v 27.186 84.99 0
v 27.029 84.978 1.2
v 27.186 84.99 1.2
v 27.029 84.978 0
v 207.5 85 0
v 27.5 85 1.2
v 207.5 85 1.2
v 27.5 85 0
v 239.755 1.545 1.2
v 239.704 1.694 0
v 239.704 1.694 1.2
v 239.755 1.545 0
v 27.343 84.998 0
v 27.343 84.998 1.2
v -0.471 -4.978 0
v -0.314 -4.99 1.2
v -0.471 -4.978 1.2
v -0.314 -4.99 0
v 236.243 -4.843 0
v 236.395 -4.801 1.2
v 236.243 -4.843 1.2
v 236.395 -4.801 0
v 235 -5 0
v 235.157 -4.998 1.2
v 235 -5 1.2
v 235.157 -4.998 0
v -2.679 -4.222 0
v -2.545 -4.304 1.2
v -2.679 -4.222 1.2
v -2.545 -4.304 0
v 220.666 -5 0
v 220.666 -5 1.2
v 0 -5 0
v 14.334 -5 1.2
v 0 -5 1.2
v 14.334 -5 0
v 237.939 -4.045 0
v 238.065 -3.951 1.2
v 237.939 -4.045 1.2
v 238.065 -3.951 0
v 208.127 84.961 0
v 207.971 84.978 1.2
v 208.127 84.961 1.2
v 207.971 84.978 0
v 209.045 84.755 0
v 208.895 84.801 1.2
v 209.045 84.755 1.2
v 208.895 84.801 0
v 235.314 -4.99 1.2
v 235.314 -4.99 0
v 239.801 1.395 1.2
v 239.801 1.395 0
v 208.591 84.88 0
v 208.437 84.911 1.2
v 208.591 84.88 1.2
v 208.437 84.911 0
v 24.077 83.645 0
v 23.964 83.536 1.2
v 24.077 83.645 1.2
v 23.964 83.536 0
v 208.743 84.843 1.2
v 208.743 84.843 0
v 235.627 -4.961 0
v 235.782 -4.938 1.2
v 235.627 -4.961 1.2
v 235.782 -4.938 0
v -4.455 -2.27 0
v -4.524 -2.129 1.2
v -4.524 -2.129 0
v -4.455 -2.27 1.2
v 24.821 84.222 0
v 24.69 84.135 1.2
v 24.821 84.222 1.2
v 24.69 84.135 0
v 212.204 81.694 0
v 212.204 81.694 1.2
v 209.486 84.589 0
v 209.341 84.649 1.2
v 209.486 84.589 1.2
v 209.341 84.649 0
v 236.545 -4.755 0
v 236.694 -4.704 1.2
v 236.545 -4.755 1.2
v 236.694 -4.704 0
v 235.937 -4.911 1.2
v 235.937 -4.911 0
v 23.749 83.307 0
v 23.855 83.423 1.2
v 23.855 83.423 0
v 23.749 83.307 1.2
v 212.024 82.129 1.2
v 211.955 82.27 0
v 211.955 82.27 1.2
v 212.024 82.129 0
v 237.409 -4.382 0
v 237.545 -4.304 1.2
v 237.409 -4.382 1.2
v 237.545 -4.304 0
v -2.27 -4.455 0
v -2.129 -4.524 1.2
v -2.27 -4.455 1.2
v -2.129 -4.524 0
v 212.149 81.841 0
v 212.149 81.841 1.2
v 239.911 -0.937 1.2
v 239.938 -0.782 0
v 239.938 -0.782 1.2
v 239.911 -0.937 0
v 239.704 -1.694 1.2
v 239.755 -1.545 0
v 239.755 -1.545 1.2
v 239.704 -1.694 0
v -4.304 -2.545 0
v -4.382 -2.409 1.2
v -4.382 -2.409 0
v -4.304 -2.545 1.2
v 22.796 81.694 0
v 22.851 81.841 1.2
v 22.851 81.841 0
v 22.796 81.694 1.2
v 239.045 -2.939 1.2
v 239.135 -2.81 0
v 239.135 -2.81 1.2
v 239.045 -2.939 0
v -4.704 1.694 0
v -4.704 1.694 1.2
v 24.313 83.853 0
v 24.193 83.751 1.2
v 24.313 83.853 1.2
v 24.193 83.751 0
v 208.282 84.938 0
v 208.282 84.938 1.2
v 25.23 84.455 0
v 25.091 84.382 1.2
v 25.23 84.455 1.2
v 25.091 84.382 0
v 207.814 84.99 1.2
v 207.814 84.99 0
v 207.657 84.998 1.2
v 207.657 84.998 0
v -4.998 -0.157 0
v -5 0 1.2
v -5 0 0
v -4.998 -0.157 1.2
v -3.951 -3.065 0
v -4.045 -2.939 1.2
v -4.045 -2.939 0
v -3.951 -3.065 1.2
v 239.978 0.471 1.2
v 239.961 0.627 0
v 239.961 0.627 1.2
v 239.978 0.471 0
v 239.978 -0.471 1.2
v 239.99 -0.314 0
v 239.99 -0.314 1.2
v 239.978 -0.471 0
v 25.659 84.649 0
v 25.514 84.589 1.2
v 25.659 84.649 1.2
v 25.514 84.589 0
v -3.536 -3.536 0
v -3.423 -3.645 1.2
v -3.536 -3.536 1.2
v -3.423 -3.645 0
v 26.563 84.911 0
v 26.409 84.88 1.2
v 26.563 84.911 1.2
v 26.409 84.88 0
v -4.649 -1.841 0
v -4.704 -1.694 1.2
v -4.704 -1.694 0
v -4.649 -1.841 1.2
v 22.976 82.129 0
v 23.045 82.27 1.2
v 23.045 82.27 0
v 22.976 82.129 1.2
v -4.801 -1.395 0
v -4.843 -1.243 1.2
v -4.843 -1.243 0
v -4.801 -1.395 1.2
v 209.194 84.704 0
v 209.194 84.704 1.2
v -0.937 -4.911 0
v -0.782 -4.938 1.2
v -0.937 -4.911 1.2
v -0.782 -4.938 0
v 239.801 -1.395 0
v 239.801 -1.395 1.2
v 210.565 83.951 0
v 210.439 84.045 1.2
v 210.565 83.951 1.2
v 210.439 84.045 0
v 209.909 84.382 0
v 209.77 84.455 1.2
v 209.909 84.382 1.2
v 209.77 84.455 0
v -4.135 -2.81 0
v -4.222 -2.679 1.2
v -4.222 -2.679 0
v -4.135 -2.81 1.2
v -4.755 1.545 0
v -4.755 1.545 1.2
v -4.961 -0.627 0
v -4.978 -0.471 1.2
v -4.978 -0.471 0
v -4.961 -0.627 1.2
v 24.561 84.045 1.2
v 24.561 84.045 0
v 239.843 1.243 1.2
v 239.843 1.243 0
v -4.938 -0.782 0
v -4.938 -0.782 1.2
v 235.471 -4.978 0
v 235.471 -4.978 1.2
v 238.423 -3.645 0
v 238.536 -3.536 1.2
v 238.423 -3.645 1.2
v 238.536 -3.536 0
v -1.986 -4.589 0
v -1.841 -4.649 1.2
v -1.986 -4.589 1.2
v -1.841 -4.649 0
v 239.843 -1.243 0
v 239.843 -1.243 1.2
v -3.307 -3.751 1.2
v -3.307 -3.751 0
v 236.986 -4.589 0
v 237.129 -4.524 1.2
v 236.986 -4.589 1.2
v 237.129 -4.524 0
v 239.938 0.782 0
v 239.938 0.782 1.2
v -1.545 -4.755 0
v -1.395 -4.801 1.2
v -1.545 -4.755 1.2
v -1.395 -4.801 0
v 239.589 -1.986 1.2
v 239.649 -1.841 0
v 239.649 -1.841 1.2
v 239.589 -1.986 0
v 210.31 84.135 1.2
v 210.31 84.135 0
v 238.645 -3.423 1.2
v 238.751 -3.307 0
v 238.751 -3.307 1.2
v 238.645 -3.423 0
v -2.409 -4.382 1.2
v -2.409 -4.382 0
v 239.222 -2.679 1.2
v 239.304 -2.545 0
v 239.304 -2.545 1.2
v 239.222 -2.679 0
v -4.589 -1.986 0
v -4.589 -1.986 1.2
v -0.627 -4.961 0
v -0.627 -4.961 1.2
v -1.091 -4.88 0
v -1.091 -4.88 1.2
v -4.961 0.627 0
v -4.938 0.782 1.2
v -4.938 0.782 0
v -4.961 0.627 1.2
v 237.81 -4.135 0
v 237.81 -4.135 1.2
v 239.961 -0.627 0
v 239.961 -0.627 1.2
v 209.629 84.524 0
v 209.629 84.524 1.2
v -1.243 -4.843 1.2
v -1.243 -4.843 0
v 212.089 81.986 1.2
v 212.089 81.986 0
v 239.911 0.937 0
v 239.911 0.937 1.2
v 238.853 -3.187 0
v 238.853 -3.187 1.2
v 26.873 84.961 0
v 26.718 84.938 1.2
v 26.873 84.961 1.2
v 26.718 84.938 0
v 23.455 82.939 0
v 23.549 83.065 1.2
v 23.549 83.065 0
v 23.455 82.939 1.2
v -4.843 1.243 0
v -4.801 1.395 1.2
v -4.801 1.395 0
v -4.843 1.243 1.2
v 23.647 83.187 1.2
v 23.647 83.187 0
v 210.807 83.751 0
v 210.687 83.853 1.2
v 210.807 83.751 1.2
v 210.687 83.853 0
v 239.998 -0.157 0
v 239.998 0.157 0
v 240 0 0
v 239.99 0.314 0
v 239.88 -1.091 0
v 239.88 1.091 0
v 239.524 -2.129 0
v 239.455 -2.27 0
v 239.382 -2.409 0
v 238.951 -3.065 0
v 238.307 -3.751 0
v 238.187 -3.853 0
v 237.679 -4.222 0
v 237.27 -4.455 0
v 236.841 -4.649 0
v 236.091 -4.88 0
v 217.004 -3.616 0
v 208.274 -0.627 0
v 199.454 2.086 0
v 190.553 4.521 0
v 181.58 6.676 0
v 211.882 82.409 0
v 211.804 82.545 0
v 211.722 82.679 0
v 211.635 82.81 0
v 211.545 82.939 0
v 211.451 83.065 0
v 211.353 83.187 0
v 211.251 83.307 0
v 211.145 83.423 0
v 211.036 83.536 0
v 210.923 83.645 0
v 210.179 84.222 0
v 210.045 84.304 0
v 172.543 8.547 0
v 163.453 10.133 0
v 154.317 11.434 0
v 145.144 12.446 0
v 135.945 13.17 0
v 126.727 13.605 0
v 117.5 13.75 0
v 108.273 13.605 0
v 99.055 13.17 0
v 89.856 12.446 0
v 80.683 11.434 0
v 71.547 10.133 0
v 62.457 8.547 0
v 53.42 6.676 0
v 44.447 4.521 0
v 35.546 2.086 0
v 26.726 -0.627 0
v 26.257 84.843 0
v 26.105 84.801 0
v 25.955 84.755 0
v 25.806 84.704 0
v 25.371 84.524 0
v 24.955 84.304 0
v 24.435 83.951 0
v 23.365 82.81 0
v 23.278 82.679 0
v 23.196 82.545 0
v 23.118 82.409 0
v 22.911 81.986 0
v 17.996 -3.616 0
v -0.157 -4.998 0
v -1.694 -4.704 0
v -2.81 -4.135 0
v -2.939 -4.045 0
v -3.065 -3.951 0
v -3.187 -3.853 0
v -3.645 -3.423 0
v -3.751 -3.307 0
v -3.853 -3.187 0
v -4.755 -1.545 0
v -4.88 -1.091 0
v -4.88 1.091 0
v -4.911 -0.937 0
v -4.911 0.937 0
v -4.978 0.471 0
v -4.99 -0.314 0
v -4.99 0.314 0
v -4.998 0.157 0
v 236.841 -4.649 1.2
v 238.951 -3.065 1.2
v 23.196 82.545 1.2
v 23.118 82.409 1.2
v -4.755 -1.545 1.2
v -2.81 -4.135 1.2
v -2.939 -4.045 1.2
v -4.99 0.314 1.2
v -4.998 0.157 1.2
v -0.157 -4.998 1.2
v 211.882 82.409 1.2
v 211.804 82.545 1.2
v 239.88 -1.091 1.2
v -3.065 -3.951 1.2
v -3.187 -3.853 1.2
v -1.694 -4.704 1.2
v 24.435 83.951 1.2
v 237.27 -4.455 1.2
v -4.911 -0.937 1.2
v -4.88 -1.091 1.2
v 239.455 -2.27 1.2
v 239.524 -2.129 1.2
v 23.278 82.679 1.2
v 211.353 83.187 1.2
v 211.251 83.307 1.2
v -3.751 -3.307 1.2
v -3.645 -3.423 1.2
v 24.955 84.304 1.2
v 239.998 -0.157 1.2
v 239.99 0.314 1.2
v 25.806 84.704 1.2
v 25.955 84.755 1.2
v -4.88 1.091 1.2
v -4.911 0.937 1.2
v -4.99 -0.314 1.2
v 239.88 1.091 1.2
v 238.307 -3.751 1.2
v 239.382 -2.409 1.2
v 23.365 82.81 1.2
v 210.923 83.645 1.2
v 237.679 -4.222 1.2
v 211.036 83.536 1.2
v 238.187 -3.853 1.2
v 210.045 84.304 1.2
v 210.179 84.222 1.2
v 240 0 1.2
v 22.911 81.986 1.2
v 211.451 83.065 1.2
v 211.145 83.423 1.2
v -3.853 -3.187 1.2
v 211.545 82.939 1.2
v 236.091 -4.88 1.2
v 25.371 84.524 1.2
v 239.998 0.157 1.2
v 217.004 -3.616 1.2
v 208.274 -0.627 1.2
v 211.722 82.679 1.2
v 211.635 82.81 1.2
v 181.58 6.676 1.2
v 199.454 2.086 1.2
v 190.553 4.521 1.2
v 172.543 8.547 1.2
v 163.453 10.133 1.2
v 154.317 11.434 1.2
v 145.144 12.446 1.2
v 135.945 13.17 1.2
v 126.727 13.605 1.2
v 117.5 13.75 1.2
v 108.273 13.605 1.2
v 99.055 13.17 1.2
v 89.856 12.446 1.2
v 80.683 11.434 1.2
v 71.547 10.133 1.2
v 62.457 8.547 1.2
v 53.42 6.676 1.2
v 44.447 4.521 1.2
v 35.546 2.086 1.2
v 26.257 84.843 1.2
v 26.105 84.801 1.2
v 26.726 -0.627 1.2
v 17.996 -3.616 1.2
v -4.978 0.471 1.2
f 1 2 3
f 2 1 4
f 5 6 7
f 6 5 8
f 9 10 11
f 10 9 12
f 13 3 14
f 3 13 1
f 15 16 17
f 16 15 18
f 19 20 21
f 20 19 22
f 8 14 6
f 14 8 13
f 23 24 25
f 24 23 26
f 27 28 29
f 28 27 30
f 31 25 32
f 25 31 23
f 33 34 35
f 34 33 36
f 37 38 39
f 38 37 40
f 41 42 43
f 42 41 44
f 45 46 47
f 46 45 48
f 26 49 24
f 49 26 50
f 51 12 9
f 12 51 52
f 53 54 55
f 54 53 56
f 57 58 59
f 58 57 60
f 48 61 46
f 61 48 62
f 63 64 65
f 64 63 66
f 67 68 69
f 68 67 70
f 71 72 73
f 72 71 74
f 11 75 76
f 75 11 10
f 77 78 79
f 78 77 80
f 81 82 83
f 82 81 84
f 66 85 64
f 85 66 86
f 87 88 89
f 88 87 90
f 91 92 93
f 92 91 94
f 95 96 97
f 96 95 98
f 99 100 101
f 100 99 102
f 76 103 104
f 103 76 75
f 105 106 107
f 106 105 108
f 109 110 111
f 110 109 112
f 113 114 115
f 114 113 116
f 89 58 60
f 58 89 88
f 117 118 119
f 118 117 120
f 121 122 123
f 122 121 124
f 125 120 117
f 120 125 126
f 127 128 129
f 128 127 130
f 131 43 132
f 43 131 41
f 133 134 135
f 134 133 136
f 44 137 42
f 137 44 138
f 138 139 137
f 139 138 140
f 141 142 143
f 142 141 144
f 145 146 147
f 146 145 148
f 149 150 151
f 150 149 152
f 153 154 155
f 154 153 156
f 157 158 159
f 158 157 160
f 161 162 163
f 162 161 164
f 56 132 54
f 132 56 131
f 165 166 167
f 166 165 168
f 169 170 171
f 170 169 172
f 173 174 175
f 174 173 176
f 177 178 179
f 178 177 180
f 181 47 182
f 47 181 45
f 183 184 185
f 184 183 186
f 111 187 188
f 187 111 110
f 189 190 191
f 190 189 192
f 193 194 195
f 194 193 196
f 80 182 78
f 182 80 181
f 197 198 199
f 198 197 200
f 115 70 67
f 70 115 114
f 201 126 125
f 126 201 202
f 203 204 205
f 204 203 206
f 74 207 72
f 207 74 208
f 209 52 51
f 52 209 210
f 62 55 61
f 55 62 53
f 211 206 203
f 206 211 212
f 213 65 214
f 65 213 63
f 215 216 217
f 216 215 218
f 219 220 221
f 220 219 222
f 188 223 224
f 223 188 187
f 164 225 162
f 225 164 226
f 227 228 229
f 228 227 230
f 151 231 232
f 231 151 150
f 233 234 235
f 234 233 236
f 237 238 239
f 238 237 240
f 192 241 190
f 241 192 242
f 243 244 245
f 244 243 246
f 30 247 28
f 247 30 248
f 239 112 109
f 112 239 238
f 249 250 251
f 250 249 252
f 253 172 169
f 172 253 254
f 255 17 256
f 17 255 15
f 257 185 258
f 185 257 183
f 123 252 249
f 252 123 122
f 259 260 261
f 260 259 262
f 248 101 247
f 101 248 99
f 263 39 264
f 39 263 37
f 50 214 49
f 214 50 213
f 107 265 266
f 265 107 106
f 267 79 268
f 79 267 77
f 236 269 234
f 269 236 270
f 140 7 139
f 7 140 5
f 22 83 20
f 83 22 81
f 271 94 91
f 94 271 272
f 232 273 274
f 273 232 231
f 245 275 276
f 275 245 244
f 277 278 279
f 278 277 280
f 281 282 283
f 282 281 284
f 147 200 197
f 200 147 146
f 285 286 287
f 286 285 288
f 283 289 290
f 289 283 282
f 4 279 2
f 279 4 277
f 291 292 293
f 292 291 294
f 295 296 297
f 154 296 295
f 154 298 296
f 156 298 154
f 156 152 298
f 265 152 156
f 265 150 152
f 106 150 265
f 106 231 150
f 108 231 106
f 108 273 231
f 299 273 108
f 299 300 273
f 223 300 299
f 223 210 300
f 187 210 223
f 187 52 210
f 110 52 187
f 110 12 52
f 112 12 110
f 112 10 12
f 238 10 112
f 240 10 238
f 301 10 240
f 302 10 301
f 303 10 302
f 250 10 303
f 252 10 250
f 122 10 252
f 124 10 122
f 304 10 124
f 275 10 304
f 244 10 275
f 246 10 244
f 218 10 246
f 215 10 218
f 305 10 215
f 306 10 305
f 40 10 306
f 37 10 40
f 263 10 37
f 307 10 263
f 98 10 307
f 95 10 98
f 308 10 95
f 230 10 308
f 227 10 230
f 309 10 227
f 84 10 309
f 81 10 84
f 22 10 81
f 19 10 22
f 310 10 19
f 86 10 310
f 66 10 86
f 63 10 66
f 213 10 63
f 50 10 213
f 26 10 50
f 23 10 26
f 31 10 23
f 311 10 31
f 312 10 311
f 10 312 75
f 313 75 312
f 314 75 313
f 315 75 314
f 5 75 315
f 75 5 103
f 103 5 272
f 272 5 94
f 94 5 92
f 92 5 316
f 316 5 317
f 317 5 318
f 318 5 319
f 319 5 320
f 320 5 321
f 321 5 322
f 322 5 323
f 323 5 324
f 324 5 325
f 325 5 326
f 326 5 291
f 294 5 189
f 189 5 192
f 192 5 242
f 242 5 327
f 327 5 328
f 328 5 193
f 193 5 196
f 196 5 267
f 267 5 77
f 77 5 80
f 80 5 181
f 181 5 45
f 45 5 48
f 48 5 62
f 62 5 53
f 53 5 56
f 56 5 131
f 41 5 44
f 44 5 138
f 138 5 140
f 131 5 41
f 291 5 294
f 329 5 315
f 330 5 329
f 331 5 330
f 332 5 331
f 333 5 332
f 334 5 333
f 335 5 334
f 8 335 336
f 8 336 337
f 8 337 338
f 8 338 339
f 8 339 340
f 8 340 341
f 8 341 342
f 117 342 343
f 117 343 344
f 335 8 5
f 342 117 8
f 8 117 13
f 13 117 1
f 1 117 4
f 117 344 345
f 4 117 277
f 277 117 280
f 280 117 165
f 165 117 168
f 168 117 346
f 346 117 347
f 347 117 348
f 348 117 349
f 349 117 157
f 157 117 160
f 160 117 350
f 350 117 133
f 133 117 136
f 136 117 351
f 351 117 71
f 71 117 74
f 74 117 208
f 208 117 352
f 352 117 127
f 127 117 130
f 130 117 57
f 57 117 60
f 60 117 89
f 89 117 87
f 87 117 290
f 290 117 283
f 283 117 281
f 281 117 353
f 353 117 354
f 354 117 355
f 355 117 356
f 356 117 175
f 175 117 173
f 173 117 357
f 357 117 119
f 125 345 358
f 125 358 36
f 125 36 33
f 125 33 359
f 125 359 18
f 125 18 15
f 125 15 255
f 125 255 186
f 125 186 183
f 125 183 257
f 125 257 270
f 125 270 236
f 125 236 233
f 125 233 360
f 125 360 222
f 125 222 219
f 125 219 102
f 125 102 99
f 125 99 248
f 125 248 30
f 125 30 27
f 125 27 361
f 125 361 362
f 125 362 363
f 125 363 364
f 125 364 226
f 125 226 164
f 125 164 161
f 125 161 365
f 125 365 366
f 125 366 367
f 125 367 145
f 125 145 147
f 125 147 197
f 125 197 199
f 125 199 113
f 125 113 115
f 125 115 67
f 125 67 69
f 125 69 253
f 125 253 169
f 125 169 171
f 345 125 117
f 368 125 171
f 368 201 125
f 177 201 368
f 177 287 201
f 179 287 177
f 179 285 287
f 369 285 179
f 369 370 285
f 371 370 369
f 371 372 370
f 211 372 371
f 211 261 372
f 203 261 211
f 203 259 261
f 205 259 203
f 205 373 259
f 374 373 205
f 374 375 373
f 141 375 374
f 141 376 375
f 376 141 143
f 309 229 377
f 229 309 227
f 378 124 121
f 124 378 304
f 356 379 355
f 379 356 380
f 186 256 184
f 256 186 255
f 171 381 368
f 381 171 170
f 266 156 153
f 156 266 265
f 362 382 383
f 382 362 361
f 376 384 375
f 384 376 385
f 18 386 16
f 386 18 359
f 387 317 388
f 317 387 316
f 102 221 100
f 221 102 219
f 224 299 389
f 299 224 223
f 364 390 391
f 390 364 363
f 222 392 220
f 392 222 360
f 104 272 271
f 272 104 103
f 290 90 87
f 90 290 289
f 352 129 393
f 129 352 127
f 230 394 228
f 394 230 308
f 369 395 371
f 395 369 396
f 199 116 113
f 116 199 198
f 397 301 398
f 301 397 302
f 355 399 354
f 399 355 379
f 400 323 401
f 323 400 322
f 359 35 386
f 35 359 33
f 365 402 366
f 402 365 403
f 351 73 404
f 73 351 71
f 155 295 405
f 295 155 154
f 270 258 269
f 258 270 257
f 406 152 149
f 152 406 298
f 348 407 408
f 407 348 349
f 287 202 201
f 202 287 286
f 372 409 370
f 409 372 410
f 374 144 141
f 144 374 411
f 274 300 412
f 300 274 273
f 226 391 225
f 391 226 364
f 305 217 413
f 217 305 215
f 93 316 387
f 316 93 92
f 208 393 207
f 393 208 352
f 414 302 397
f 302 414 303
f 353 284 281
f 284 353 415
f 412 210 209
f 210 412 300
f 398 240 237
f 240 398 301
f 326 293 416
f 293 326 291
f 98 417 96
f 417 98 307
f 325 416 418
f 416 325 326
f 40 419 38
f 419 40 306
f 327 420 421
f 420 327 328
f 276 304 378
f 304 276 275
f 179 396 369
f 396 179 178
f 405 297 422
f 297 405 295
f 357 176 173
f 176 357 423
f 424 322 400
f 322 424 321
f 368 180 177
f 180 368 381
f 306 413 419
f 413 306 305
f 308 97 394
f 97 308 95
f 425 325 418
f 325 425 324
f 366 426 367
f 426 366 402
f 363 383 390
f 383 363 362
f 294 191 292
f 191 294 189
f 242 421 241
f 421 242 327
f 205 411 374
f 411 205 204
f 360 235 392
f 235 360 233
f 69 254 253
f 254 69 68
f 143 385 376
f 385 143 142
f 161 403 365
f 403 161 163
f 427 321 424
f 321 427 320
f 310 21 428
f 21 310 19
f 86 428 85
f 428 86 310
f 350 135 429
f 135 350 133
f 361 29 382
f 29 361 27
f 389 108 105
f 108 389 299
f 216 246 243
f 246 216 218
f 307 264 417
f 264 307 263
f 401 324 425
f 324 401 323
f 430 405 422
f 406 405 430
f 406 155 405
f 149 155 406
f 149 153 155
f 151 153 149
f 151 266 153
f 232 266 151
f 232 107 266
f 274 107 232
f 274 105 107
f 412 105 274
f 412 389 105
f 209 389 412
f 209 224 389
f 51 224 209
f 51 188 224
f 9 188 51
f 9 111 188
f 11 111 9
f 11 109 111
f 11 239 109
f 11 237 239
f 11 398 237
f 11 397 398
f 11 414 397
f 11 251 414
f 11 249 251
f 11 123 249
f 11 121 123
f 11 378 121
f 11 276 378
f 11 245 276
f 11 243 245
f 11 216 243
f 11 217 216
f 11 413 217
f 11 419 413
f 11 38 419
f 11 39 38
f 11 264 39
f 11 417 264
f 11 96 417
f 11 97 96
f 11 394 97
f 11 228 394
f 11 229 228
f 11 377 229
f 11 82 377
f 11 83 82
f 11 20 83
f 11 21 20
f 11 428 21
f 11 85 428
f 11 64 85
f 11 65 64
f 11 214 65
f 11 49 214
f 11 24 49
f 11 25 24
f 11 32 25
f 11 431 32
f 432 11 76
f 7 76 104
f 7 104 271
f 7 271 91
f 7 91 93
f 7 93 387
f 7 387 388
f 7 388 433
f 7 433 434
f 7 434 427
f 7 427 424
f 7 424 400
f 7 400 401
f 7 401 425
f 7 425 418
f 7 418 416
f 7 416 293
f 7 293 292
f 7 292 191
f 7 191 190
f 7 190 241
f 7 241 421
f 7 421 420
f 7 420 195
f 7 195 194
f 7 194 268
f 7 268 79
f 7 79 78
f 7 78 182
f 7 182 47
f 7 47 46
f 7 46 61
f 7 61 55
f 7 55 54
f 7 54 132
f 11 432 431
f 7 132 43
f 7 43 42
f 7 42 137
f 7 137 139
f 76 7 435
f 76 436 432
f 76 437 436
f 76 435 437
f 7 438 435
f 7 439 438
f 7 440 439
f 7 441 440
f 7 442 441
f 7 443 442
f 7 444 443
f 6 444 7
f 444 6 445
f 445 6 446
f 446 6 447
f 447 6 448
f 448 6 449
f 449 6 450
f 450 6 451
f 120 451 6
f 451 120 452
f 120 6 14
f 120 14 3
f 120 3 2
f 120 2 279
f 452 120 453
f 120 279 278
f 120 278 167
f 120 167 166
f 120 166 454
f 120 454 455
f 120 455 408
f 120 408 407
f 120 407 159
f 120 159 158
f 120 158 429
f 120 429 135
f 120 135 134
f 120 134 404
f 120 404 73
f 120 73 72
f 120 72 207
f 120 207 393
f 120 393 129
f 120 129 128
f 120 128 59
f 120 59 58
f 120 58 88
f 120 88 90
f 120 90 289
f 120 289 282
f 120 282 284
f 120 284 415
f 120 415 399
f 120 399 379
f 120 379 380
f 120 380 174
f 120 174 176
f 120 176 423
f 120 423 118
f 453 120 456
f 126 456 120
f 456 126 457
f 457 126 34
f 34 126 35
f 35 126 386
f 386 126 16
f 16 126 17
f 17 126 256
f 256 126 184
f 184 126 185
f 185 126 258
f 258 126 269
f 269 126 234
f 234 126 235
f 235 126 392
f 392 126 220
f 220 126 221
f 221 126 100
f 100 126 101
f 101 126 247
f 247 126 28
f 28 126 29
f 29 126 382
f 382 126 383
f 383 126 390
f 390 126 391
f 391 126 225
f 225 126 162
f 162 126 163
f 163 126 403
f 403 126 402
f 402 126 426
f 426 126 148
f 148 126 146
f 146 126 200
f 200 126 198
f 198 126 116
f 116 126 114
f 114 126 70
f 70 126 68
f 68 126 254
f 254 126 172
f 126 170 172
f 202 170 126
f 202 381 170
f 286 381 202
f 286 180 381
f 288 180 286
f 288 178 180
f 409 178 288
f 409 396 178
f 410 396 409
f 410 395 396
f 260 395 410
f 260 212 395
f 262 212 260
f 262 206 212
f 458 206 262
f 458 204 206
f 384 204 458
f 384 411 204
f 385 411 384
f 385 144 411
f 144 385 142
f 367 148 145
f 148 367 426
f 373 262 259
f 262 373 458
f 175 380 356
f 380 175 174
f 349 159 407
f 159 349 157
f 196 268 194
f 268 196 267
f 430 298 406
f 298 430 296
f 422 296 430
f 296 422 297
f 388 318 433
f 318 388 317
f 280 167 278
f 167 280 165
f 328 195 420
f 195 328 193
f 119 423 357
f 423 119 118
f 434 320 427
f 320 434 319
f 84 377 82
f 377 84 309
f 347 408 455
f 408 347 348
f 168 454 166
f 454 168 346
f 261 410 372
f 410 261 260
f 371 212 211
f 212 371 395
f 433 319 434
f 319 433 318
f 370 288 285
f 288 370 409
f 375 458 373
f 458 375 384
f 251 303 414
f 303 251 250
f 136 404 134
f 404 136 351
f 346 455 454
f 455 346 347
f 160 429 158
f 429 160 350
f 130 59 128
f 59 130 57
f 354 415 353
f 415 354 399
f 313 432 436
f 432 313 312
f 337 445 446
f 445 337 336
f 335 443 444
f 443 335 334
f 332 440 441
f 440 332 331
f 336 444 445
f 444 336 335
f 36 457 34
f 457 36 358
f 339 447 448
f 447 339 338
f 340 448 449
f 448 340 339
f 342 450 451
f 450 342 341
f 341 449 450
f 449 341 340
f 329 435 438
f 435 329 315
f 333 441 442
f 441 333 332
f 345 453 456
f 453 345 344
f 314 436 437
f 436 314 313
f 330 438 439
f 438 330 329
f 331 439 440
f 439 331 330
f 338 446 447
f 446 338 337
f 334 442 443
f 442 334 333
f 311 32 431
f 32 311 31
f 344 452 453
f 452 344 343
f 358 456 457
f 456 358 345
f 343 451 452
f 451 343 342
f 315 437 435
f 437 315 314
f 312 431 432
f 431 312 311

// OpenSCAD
/*
 * flight deck platform
 */

$fn=200;

rounding_radius=5;

deck_thickness=1.2;
deck_width_bottom=245-2*rounding_radius;
deck_width_top=190-2*rounding_radius;
deck_indent=(deck_width_bottom-deck_width_top)/2;
deck_height=90-2*rounding_radius;

module 2d_deck() {
   deck_polygon=[[0,0], [deck_width_bottom, 0], [deck_width_bottom-deck_indent, deck_height], [deck_indent, deck_height]];
   polygon(deck_polygon);
};


module 3d_deck() {
   linear_extrude(height=deck_thickness) {
     minkowski() {
         2d_deck();
         circle(r=rounding_radius);
      }
   }
}

module deck_cutout() {
   diameter = deck_width_bottom*2.5;
   translate([diameter/2-(diameter-deck_width_bottom)/2,
             -(deck_height*3.5),
	     -1]) {
      cylinder(deck_thickness+2, d=diameter);
   }
}

difference() {
   3d_deck();
   deck_cutout();
}
